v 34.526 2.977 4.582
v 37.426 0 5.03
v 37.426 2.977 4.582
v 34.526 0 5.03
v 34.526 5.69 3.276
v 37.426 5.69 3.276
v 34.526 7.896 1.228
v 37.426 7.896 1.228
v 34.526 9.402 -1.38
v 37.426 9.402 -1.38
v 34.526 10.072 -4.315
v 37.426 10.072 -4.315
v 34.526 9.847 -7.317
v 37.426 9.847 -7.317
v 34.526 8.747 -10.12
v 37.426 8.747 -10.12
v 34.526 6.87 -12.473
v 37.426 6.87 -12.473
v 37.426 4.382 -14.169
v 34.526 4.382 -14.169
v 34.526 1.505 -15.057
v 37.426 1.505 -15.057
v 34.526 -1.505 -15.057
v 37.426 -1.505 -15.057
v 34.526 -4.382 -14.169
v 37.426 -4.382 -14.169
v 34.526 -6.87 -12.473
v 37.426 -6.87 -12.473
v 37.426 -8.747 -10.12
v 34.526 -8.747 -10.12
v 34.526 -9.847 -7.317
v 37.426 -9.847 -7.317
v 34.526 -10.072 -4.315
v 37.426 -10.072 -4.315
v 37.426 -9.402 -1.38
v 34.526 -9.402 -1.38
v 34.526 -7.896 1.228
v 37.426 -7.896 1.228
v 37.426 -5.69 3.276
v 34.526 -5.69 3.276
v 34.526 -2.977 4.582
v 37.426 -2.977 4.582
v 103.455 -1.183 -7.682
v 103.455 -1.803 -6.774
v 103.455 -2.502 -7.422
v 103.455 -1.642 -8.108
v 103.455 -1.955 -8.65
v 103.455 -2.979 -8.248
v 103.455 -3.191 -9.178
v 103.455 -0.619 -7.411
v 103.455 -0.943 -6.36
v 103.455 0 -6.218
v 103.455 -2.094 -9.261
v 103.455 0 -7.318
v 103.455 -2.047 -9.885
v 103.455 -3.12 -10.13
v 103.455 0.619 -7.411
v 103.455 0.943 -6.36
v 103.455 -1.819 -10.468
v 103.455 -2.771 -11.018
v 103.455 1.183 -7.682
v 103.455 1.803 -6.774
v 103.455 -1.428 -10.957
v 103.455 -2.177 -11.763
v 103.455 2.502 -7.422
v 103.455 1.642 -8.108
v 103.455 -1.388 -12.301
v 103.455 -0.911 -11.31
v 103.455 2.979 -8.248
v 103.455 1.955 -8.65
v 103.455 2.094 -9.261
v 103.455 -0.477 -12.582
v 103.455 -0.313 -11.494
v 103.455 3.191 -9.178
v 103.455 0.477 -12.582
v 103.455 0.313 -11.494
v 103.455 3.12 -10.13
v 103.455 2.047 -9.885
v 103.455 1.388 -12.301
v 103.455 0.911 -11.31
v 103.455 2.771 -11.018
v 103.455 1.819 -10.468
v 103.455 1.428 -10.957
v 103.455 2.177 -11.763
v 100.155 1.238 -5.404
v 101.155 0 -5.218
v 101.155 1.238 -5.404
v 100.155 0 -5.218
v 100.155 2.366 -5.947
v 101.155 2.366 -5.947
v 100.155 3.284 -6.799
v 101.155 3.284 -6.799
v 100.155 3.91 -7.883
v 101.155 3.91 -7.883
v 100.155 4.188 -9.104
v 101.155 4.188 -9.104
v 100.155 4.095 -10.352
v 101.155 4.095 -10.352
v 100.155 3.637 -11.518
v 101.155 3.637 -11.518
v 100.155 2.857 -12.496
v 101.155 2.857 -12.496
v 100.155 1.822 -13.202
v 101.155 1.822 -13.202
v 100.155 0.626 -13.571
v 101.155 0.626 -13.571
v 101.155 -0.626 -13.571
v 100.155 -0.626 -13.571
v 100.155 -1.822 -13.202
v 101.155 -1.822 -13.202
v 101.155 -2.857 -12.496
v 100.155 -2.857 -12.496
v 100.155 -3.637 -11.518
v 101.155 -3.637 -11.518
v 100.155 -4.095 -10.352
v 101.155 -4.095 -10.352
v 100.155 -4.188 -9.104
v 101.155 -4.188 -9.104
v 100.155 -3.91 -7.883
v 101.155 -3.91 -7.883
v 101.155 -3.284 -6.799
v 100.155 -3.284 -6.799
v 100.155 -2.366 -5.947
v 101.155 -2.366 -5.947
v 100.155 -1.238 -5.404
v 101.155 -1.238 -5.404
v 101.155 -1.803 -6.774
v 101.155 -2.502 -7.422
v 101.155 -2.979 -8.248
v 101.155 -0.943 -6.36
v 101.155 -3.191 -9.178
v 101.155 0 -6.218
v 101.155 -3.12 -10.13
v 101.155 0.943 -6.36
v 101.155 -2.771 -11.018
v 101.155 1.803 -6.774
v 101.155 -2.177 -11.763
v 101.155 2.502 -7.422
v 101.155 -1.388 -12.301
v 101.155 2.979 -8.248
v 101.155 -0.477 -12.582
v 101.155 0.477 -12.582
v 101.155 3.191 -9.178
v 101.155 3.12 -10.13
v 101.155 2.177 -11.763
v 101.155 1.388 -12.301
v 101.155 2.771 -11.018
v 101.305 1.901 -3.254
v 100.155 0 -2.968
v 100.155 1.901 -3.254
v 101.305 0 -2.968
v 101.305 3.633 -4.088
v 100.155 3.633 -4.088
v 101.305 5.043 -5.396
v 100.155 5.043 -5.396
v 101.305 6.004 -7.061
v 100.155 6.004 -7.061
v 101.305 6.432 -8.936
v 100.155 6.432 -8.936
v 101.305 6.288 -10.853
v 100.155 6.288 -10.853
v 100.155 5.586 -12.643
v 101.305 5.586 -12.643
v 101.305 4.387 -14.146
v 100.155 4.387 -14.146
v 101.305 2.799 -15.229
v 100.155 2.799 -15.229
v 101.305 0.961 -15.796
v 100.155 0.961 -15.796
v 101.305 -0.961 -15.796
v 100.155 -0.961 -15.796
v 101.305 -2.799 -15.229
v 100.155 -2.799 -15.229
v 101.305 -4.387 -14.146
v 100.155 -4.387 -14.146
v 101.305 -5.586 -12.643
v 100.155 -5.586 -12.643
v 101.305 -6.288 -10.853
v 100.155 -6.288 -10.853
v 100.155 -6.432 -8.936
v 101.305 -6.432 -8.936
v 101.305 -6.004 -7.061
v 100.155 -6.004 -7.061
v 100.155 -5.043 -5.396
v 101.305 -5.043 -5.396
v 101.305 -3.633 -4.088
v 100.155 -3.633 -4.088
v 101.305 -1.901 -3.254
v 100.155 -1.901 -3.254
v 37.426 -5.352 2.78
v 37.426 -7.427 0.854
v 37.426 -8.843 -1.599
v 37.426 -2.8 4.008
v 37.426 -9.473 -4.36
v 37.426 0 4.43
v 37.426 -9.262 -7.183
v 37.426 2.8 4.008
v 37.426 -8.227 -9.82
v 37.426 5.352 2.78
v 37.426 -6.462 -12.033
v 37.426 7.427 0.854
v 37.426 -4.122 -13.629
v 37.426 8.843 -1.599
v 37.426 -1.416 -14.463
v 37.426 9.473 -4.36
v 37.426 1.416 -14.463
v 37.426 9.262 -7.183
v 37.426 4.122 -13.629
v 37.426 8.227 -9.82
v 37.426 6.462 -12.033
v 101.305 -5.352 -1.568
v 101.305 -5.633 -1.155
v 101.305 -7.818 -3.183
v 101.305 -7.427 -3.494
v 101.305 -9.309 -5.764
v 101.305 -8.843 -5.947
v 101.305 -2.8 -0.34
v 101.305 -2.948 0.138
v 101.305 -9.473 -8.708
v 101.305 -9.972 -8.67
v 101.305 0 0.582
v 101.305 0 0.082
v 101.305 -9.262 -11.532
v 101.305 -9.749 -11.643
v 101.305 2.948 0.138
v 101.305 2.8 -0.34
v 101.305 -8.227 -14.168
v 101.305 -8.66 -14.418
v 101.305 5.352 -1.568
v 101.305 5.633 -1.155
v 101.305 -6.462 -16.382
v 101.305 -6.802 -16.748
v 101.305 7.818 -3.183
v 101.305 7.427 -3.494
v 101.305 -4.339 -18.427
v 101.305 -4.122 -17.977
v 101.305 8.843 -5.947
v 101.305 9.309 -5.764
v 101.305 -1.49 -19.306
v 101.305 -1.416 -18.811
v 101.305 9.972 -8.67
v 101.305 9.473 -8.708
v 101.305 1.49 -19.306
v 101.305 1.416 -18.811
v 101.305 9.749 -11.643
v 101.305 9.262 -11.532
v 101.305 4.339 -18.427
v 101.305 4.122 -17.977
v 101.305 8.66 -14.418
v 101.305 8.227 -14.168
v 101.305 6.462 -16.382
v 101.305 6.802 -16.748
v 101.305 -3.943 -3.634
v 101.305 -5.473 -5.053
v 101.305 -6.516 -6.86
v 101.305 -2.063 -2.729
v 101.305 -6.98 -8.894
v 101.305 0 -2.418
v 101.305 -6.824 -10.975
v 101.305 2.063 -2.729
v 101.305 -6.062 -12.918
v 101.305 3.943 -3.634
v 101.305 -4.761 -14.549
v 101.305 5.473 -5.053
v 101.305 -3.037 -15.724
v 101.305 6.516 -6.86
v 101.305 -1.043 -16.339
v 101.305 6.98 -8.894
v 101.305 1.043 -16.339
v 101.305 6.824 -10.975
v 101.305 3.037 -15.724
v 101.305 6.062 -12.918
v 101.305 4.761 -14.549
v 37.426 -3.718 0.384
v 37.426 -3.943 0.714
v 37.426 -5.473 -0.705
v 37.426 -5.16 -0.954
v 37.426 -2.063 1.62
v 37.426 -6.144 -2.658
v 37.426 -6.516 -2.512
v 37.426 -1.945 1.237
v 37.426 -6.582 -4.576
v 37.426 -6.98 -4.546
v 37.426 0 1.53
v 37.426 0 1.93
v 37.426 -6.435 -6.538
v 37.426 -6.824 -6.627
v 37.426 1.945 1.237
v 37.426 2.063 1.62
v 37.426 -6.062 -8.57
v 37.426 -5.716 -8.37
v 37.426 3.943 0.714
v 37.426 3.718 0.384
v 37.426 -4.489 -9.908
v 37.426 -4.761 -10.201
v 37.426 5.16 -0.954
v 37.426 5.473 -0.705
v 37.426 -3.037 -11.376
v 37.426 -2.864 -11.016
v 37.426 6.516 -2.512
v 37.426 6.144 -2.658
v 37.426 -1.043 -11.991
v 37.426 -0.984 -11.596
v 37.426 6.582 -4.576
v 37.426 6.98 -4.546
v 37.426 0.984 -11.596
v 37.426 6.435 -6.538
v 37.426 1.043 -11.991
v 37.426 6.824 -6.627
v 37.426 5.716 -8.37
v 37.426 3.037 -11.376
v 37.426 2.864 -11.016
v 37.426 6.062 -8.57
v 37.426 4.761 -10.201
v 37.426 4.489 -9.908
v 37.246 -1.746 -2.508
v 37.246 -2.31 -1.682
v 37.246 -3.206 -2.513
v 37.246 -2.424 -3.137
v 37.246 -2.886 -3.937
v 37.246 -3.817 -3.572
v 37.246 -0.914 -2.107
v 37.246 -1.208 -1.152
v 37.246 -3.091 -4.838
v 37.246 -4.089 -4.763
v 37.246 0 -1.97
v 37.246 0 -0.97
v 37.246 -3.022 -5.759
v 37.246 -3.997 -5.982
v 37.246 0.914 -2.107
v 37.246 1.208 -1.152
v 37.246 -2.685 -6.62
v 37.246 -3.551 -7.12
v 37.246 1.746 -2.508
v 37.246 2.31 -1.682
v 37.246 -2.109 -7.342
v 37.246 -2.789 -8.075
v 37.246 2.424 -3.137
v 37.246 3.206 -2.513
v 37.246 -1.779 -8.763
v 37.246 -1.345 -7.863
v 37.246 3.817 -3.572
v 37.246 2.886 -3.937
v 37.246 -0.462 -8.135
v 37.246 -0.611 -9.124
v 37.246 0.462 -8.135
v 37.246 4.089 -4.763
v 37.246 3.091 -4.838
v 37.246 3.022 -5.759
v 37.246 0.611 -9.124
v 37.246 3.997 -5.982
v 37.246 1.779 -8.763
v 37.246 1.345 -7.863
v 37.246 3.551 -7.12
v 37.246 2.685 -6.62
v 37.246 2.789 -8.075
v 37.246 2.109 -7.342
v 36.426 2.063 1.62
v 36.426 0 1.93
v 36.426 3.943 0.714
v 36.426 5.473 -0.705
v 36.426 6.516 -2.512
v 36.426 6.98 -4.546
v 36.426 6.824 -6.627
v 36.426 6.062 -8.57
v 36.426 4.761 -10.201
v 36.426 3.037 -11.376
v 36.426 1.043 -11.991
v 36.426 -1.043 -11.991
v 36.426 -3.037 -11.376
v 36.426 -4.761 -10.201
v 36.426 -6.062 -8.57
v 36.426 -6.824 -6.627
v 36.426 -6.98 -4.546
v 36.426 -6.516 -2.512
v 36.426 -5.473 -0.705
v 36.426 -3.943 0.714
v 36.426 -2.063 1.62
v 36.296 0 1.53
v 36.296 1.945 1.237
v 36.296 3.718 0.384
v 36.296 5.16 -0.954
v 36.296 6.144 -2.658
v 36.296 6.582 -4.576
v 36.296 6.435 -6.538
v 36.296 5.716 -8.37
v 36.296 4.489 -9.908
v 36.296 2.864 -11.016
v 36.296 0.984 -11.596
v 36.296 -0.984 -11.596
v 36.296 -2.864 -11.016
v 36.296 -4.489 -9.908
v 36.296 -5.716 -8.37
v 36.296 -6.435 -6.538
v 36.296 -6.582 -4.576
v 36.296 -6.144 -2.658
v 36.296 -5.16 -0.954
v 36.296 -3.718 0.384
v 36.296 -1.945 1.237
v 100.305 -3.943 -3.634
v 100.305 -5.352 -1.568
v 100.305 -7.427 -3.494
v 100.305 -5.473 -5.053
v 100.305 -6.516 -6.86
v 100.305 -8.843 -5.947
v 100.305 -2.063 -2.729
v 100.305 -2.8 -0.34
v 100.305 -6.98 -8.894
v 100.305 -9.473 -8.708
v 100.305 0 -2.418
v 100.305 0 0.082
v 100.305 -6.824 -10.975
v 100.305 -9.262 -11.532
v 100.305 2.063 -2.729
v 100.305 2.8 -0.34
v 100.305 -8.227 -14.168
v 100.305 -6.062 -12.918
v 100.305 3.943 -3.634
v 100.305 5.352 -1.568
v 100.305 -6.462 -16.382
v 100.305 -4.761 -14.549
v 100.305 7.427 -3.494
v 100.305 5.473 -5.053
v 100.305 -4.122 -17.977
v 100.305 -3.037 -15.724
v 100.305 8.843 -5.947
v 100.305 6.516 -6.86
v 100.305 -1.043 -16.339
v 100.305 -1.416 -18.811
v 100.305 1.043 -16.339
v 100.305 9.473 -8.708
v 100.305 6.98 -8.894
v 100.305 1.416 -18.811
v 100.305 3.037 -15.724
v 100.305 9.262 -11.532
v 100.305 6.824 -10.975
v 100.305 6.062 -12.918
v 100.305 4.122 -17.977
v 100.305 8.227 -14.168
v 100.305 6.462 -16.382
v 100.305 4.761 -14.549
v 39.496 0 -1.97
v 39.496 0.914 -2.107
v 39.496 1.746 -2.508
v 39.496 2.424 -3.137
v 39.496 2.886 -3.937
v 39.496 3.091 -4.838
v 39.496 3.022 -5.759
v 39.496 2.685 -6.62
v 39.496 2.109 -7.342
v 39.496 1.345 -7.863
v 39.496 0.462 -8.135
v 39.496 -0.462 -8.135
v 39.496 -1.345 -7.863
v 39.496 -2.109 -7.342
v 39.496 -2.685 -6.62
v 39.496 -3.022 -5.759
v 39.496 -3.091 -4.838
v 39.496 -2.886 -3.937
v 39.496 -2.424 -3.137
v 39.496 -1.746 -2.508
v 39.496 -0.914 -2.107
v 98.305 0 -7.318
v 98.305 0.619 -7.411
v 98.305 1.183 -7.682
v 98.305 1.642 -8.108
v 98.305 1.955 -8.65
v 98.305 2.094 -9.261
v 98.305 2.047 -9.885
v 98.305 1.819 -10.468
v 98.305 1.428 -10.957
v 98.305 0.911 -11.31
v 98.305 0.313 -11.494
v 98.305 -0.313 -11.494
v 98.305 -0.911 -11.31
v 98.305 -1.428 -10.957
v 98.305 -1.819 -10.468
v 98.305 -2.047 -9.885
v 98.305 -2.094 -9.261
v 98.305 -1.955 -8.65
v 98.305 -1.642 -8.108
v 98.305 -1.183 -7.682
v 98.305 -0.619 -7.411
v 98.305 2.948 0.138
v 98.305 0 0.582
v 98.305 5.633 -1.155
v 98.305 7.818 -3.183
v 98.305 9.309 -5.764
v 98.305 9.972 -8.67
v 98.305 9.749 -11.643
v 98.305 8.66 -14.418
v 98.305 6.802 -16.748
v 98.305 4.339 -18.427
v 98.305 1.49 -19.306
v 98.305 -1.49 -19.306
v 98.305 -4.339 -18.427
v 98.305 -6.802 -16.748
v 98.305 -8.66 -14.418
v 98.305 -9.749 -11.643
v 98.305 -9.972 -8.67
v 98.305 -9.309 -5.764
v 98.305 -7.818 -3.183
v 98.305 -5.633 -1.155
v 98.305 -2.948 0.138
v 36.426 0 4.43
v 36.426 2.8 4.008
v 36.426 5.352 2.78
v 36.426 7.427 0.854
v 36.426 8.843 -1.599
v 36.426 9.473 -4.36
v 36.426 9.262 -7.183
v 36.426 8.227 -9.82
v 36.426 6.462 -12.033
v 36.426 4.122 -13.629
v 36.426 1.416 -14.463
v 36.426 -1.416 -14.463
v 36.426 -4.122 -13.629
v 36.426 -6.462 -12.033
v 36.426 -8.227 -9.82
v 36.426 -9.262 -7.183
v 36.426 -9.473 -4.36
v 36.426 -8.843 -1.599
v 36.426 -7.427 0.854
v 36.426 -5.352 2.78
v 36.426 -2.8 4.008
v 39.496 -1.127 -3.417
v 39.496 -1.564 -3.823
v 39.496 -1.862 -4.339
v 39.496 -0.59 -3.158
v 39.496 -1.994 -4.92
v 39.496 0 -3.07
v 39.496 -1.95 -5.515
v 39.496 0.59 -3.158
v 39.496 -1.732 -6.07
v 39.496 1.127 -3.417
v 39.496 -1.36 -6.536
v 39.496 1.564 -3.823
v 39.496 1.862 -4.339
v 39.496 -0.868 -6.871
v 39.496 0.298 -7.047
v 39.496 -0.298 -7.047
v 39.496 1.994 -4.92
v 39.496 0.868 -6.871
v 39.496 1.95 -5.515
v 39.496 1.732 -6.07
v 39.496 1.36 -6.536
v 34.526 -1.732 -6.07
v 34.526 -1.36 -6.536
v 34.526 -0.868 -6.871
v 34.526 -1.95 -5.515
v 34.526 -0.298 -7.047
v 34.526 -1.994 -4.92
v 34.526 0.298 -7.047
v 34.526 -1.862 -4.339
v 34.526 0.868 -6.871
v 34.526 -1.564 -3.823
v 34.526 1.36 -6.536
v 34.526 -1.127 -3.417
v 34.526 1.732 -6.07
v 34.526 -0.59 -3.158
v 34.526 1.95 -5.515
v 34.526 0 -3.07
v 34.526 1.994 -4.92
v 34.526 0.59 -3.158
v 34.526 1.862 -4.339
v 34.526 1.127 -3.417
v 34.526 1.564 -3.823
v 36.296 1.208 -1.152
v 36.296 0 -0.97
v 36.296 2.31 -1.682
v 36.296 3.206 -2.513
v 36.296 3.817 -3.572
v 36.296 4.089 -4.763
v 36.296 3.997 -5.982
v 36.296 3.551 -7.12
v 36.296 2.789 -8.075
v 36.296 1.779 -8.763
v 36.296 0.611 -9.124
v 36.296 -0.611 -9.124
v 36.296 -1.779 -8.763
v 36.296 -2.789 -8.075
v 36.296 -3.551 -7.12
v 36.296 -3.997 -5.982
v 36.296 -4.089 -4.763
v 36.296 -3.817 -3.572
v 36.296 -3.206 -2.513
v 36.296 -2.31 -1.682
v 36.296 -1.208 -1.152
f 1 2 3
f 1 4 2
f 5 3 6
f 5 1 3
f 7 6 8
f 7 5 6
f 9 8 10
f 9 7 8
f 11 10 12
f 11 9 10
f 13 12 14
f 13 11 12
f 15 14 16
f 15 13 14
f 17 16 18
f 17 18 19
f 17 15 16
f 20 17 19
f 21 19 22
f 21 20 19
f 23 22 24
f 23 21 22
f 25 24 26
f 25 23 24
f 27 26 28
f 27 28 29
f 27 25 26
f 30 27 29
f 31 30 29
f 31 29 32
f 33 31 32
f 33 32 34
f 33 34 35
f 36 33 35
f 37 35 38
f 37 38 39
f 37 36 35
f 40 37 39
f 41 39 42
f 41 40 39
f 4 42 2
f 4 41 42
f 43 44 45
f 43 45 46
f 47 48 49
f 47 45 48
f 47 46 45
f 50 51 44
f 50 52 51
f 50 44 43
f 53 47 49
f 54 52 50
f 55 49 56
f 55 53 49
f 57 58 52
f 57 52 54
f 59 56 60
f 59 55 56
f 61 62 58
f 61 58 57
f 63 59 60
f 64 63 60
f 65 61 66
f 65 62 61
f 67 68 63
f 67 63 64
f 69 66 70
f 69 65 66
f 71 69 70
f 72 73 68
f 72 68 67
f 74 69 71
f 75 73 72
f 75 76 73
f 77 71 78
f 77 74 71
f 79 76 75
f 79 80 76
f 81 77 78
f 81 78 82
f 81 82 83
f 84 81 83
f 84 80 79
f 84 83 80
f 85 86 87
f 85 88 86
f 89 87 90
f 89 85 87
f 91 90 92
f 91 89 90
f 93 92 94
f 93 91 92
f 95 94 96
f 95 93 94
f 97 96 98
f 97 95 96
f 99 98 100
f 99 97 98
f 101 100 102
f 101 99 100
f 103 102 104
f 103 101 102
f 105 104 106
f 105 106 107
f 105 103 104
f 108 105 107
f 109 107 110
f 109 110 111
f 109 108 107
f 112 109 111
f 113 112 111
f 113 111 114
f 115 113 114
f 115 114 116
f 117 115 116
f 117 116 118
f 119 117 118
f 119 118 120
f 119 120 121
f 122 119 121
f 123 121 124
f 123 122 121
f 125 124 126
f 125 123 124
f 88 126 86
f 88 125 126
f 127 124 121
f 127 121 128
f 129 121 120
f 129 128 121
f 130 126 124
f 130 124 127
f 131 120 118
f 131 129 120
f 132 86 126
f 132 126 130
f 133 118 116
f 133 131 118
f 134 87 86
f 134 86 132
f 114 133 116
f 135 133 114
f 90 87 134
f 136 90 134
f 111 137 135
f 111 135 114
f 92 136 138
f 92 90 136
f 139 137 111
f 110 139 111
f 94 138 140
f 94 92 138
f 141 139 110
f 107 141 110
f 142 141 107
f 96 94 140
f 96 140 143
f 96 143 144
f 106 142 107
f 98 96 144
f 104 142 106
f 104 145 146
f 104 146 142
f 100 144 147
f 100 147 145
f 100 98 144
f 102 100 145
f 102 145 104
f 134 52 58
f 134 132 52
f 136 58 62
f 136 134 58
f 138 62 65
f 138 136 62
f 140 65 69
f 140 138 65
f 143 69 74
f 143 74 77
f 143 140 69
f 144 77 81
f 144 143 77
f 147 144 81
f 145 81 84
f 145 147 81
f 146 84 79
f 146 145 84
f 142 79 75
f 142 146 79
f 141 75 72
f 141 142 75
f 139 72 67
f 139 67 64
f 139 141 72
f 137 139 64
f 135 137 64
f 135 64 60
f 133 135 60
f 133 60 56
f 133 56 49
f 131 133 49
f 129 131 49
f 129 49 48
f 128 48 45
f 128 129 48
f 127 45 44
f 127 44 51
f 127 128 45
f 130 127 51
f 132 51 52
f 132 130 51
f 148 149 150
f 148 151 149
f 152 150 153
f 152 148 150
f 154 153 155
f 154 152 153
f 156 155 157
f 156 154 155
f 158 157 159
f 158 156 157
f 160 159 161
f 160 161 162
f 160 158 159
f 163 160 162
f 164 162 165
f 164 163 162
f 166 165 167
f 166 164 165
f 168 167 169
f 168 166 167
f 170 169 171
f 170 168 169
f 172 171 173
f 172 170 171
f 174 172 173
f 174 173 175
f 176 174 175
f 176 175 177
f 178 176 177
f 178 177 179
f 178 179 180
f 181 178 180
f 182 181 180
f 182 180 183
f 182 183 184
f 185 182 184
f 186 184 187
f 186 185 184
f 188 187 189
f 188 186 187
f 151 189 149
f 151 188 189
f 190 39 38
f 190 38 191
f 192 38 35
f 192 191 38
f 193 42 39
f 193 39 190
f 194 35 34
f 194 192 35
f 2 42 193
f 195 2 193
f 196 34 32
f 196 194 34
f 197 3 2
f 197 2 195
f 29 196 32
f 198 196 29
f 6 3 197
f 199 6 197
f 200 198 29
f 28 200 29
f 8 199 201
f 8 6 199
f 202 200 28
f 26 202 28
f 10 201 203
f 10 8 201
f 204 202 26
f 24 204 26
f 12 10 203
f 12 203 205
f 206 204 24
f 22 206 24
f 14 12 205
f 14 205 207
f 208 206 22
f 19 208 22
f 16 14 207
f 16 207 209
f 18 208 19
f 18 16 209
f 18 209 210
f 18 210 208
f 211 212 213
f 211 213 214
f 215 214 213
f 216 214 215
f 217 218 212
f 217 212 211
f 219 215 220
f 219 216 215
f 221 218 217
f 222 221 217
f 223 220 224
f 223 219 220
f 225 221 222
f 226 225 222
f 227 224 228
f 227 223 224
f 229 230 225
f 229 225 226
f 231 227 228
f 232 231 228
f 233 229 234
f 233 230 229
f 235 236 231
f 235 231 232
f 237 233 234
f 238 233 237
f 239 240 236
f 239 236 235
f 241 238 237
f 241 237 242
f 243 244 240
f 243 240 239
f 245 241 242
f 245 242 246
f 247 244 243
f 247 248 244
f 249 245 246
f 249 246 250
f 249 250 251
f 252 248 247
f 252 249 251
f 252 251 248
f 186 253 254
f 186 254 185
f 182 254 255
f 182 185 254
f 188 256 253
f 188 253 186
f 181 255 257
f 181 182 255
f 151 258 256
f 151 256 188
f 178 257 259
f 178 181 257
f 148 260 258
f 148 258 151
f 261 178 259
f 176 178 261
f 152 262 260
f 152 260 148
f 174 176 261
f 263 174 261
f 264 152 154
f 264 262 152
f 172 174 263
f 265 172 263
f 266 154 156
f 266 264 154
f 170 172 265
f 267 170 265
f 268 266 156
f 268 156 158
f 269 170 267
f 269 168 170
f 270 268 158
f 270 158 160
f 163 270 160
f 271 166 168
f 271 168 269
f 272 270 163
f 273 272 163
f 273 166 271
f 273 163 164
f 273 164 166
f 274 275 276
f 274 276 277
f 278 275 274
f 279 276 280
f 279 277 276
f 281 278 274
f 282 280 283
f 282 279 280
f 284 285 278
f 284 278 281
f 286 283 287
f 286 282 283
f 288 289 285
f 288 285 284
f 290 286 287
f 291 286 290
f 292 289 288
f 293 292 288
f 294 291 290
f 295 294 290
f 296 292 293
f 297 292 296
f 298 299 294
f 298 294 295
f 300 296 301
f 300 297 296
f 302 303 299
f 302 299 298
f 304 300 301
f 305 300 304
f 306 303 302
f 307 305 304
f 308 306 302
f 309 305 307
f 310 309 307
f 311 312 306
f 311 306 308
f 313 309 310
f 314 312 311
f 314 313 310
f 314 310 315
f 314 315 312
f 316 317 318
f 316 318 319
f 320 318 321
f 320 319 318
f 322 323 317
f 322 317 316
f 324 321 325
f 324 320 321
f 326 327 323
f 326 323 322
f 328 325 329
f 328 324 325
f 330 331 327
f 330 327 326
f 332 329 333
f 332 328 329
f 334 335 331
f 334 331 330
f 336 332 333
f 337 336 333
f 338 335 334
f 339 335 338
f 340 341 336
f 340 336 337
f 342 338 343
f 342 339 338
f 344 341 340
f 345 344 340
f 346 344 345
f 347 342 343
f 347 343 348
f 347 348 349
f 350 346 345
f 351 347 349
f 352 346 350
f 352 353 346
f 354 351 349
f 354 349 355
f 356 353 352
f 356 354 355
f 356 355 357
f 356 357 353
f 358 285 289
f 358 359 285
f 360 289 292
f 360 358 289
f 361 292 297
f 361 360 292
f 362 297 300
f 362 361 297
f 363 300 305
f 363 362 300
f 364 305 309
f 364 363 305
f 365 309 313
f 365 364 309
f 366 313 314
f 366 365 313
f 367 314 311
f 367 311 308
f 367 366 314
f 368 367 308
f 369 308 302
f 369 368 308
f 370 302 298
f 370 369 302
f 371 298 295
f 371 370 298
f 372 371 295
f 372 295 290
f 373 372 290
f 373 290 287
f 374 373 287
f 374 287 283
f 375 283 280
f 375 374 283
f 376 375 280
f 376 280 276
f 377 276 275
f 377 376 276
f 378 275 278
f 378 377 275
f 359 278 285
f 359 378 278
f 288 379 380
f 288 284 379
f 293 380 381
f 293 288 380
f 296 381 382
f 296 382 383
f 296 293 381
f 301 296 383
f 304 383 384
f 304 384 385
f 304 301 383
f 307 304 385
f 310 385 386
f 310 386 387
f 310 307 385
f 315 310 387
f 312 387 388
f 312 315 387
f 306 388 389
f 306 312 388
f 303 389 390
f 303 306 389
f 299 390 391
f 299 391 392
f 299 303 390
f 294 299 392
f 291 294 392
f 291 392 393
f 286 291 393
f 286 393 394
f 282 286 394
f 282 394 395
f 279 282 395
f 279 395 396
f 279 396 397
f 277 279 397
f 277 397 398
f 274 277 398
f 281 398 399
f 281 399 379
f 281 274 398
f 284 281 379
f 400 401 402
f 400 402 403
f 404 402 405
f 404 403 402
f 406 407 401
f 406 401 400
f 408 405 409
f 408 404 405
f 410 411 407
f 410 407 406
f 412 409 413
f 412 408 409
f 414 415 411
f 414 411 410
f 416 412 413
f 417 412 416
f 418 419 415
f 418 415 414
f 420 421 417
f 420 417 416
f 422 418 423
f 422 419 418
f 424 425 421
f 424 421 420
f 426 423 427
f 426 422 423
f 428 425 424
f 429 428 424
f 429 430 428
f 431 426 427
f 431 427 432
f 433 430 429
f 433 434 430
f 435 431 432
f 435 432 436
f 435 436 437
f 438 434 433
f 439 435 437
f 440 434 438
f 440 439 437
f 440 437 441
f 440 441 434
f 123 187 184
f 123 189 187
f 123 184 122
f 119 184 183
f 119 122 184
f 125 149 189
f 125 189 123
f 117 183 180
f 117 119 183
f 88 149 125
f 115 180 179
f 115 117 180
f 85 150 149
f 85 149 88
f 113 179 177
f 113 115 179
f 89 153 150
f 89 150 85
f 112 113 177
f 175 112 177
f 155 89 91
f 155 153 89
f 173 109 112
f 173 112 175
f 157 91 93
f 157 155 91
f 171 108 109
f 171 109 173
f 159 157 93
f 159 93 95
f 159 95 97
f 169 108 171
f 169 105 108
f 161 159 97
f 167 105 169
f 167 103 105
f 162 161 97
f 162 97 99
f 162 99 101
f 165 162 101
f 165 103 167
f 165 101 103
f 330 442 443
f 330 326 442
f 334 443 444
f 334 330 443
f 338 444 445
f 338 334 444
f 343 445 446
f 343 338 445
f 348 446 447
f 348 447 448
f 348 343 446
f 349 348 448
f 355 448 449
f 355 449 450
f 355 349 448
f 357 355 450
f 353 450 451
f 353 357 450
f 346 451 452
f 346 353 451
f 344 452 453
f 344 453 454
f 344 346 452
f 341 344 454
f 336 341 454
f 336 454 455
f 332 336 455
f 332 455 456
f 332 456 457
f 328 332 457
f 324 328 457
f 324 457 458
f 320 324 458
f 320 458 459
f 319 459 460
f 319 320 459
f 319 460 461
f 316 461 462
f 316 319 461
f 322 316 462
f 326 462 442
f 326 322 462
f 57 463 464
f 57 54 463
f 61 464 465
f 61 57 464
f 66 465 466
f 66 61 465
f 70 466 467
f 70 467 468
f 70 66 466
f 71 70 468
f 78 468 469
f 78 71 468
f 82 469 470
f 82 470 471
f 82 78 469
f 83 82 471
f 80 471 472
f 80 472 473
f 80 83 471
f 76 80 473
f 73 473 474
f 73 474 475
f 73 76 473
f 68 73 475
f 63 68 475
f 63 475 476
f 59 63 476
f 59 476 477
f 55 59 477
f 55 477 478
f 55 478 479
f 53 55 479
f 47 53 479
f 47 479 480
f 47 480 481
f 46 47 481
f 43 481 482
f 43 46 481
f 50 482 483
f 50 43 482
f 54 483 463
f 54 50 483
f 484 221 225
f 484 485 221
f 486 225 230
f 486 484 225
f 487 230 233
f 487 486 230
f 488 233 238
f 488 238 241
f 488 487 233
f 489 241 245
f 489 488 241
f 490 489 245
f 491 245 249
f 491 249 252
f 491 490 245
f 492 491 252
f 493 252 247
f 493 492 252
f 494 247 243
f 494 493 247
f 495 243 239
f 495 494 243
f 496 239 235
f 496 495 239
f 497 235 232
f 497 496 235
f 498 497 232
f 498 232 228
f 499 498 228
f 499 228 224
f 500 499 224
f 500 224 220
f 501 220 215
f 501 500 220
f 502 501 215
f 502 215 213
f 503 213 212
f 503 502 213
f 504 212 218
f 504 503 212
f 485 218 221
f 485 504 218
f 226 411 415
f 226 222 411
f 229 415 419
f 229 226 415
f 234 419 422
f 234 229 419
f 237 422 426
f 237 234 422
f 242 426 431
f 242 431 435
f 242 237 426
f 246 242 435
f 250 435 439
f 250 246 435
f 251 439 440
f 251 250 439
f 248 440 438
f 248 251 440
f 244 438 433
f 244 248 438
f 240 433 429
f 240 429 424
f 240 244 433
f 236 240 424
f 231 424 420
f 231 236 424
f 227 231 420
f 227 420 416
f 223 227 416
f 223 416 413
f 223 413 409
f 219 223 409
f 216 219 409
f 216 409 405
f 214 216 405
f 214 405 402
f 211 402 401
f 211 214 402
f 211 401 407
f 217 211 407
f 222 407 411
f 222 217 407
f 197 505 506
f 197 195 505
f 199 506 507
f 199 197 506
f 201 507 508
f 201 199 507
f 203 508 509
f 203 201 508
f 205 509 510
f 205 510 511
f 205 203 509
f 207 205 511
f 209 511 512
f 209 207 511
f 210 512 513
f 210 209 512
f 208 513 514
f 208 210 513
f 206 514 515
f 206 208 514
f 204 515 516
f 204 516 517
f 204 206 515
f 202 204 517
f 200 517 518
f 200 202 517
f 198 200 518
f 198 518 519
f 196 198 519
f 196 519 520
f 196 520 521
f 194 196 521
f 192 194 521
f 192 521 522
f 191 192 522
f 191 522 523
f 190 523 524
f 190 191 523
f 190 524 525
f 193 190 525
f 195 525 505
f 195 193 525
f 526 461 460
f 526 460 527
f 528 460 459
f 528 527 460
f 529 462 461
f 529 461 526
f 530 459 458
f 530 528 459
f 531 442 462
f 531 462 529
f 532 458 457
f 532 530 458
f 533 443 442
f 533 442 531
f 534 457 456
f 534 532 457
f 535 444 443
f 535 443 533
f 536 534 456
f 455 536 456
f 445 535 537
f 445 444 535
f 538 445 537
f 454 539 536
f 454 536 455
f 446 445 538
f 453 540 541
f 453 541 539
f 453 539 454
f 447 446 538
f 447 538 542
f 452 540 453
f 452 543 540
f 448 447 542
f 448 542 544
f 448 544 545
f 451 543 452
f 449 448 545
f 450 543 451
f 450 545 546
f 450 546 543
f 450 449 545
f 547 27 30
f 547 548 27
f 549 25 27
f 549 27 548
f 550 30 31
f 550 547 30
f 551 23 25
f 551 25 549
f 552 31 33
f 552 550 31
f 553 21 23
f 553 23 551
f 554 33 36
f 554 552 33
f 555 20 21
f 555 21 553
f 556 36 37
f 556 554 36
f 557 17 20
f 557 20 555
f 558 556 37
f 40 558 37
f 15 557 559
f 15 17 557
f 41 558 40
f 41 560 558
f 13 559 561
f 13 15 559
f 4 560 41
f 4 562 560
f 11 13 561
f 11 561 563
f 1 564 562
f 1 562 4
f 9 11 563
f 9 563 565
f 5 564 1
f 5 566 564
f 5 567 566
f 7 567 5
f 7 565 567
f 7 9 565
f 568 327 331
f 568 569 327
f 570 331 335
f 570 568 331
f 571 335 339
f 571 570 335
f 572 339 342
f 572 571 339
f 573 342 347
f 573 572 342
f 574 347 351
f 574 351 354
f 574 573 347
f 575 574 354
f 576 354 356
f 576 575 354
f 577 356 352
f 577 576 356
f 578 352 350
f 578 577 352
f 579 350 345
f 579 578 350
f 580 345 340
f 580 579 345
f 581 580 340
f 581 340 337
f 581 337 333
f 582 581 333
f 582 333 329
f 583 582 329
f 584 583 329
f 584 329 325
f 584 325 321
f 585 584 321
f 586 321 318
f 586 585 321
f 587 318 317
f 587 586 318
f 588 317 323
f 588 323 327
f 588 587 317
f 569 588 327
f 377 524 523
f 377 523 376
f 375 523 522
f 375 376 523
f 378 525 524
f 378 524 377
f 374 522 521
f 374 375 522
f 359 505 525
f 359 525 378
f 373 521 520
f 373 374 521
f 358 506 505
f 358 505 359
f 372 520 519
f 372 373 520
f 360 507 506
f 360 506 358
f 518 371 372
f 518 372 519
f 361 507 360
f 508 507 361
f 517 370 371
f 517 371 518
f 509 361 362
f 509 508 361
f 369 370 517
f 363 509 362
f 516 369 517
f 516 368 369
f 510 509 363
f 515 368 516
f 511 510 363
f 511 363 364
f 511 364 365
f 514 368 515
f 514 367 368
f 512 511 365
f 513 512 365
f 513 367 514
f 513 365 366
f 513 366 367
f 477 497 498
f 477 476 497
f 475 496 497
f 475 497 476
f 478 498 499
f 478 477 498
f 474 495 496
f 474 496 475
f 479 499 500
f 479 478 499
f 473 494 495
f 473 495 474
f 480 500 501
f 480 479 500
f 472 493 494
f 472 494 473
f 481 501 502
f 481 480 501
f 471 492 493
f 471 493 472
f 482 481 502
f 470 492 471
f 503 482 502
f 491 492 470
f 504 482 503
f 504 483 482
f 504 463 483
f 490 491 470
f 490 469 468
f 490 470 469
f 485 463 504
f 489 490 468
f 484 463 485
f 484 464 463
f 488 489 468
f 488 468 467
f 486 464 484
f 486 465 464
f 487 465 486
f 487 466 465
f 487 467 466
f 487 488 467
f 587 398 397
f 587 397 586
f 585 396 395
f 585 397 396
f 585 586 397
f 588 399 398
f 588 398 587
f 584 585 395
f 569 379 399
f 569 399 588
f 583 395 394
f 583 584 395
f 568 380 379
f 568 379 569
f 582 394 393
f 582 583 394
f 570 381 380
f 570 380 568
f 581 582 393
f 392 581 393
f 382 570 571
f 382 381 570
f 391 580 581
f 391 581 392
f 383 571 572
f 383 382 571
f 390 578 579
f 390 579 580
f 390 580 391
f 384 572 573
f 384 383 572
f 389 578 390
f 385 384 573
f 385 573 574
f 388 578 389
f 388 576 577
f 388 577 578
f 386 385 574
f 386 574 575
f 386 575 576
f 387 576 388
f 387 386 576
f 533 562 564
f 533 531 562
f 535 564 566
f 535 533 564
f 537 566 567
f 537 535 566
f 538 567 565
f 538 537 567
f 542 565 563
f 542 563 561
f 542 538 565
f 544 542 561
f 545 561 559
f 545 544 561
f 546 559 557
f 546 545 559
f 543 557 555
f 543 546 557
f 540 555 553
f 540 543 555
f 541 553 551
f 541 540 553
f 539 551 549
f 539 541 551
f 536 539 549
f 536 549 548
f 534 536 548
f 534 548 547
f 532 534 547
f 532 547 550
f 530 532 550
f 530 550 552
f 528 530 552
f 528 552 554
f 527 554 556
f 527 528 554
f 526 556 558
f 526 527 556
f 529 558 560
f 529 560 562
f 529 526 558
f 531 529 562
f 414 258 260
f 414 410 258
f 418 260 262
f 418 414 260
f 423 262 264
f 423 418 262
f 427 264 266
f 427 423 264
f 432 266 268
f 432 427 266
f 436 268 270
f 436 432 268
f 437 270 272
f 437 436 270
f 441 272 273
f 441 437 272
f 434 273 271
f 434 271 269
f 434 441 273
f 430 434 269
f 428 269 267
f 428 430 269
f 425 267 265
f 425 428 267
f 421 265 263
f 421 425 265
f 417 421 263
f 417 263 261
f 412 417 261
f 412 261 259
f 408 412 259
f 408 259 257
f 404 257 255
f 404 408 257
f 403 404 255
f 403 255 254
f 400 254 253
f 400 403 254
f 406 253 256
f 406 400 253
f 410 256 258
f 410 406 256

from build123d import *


with BuildPart() as f3:
    # F1 (on Front) → F3 (revolve)
    with BuildSketch(Plane.XZ):
        Polygon((34.526415, -3.069505), (39.496415, -3.069505), (39.496415, -1.969505), (37.246415, -1.969505), (37.246415, -0.969505), (36.296415, -0.969505), (36.296415, 1.530495), (37.426415, 1.530495), (37.426415, 1.930495), (36.426415, 1.930495), (36.426415, 4.430495), (37.426415, 4.430495), (37.426415, 5.030495), (34.526415, 5.030495), align=None)
    revolve(axis=Axis((38.857302, 0, -5.069505), (-1, 0, 0)))


with BuildPart() as f5:
    # F4 (on Front) → F5 (revolve)
    with BuildSketch(Plane.XZ):
        Polygon((98.305207, -7.317564), (103.455207, -7.317564), (103.455207, -6.217564), (101.155207, -6.217564), (101.155207, -5.217564), (100.155207, -5.217564), (100.155207, -2.967564), (101.305207, -2.967564), (101.305207, -2.417564), (100.305207, -2.417564), (100.305207, 0.082436), (101.305207, 0.082436), (101.305207, 0.582436), (98.305207, 0.582436), align=None)
    revolve(axis=Axis((102.816093, 0, -9.417564), (-1, 0, 0)))


solid = Compound([f3.part, f5.part])
